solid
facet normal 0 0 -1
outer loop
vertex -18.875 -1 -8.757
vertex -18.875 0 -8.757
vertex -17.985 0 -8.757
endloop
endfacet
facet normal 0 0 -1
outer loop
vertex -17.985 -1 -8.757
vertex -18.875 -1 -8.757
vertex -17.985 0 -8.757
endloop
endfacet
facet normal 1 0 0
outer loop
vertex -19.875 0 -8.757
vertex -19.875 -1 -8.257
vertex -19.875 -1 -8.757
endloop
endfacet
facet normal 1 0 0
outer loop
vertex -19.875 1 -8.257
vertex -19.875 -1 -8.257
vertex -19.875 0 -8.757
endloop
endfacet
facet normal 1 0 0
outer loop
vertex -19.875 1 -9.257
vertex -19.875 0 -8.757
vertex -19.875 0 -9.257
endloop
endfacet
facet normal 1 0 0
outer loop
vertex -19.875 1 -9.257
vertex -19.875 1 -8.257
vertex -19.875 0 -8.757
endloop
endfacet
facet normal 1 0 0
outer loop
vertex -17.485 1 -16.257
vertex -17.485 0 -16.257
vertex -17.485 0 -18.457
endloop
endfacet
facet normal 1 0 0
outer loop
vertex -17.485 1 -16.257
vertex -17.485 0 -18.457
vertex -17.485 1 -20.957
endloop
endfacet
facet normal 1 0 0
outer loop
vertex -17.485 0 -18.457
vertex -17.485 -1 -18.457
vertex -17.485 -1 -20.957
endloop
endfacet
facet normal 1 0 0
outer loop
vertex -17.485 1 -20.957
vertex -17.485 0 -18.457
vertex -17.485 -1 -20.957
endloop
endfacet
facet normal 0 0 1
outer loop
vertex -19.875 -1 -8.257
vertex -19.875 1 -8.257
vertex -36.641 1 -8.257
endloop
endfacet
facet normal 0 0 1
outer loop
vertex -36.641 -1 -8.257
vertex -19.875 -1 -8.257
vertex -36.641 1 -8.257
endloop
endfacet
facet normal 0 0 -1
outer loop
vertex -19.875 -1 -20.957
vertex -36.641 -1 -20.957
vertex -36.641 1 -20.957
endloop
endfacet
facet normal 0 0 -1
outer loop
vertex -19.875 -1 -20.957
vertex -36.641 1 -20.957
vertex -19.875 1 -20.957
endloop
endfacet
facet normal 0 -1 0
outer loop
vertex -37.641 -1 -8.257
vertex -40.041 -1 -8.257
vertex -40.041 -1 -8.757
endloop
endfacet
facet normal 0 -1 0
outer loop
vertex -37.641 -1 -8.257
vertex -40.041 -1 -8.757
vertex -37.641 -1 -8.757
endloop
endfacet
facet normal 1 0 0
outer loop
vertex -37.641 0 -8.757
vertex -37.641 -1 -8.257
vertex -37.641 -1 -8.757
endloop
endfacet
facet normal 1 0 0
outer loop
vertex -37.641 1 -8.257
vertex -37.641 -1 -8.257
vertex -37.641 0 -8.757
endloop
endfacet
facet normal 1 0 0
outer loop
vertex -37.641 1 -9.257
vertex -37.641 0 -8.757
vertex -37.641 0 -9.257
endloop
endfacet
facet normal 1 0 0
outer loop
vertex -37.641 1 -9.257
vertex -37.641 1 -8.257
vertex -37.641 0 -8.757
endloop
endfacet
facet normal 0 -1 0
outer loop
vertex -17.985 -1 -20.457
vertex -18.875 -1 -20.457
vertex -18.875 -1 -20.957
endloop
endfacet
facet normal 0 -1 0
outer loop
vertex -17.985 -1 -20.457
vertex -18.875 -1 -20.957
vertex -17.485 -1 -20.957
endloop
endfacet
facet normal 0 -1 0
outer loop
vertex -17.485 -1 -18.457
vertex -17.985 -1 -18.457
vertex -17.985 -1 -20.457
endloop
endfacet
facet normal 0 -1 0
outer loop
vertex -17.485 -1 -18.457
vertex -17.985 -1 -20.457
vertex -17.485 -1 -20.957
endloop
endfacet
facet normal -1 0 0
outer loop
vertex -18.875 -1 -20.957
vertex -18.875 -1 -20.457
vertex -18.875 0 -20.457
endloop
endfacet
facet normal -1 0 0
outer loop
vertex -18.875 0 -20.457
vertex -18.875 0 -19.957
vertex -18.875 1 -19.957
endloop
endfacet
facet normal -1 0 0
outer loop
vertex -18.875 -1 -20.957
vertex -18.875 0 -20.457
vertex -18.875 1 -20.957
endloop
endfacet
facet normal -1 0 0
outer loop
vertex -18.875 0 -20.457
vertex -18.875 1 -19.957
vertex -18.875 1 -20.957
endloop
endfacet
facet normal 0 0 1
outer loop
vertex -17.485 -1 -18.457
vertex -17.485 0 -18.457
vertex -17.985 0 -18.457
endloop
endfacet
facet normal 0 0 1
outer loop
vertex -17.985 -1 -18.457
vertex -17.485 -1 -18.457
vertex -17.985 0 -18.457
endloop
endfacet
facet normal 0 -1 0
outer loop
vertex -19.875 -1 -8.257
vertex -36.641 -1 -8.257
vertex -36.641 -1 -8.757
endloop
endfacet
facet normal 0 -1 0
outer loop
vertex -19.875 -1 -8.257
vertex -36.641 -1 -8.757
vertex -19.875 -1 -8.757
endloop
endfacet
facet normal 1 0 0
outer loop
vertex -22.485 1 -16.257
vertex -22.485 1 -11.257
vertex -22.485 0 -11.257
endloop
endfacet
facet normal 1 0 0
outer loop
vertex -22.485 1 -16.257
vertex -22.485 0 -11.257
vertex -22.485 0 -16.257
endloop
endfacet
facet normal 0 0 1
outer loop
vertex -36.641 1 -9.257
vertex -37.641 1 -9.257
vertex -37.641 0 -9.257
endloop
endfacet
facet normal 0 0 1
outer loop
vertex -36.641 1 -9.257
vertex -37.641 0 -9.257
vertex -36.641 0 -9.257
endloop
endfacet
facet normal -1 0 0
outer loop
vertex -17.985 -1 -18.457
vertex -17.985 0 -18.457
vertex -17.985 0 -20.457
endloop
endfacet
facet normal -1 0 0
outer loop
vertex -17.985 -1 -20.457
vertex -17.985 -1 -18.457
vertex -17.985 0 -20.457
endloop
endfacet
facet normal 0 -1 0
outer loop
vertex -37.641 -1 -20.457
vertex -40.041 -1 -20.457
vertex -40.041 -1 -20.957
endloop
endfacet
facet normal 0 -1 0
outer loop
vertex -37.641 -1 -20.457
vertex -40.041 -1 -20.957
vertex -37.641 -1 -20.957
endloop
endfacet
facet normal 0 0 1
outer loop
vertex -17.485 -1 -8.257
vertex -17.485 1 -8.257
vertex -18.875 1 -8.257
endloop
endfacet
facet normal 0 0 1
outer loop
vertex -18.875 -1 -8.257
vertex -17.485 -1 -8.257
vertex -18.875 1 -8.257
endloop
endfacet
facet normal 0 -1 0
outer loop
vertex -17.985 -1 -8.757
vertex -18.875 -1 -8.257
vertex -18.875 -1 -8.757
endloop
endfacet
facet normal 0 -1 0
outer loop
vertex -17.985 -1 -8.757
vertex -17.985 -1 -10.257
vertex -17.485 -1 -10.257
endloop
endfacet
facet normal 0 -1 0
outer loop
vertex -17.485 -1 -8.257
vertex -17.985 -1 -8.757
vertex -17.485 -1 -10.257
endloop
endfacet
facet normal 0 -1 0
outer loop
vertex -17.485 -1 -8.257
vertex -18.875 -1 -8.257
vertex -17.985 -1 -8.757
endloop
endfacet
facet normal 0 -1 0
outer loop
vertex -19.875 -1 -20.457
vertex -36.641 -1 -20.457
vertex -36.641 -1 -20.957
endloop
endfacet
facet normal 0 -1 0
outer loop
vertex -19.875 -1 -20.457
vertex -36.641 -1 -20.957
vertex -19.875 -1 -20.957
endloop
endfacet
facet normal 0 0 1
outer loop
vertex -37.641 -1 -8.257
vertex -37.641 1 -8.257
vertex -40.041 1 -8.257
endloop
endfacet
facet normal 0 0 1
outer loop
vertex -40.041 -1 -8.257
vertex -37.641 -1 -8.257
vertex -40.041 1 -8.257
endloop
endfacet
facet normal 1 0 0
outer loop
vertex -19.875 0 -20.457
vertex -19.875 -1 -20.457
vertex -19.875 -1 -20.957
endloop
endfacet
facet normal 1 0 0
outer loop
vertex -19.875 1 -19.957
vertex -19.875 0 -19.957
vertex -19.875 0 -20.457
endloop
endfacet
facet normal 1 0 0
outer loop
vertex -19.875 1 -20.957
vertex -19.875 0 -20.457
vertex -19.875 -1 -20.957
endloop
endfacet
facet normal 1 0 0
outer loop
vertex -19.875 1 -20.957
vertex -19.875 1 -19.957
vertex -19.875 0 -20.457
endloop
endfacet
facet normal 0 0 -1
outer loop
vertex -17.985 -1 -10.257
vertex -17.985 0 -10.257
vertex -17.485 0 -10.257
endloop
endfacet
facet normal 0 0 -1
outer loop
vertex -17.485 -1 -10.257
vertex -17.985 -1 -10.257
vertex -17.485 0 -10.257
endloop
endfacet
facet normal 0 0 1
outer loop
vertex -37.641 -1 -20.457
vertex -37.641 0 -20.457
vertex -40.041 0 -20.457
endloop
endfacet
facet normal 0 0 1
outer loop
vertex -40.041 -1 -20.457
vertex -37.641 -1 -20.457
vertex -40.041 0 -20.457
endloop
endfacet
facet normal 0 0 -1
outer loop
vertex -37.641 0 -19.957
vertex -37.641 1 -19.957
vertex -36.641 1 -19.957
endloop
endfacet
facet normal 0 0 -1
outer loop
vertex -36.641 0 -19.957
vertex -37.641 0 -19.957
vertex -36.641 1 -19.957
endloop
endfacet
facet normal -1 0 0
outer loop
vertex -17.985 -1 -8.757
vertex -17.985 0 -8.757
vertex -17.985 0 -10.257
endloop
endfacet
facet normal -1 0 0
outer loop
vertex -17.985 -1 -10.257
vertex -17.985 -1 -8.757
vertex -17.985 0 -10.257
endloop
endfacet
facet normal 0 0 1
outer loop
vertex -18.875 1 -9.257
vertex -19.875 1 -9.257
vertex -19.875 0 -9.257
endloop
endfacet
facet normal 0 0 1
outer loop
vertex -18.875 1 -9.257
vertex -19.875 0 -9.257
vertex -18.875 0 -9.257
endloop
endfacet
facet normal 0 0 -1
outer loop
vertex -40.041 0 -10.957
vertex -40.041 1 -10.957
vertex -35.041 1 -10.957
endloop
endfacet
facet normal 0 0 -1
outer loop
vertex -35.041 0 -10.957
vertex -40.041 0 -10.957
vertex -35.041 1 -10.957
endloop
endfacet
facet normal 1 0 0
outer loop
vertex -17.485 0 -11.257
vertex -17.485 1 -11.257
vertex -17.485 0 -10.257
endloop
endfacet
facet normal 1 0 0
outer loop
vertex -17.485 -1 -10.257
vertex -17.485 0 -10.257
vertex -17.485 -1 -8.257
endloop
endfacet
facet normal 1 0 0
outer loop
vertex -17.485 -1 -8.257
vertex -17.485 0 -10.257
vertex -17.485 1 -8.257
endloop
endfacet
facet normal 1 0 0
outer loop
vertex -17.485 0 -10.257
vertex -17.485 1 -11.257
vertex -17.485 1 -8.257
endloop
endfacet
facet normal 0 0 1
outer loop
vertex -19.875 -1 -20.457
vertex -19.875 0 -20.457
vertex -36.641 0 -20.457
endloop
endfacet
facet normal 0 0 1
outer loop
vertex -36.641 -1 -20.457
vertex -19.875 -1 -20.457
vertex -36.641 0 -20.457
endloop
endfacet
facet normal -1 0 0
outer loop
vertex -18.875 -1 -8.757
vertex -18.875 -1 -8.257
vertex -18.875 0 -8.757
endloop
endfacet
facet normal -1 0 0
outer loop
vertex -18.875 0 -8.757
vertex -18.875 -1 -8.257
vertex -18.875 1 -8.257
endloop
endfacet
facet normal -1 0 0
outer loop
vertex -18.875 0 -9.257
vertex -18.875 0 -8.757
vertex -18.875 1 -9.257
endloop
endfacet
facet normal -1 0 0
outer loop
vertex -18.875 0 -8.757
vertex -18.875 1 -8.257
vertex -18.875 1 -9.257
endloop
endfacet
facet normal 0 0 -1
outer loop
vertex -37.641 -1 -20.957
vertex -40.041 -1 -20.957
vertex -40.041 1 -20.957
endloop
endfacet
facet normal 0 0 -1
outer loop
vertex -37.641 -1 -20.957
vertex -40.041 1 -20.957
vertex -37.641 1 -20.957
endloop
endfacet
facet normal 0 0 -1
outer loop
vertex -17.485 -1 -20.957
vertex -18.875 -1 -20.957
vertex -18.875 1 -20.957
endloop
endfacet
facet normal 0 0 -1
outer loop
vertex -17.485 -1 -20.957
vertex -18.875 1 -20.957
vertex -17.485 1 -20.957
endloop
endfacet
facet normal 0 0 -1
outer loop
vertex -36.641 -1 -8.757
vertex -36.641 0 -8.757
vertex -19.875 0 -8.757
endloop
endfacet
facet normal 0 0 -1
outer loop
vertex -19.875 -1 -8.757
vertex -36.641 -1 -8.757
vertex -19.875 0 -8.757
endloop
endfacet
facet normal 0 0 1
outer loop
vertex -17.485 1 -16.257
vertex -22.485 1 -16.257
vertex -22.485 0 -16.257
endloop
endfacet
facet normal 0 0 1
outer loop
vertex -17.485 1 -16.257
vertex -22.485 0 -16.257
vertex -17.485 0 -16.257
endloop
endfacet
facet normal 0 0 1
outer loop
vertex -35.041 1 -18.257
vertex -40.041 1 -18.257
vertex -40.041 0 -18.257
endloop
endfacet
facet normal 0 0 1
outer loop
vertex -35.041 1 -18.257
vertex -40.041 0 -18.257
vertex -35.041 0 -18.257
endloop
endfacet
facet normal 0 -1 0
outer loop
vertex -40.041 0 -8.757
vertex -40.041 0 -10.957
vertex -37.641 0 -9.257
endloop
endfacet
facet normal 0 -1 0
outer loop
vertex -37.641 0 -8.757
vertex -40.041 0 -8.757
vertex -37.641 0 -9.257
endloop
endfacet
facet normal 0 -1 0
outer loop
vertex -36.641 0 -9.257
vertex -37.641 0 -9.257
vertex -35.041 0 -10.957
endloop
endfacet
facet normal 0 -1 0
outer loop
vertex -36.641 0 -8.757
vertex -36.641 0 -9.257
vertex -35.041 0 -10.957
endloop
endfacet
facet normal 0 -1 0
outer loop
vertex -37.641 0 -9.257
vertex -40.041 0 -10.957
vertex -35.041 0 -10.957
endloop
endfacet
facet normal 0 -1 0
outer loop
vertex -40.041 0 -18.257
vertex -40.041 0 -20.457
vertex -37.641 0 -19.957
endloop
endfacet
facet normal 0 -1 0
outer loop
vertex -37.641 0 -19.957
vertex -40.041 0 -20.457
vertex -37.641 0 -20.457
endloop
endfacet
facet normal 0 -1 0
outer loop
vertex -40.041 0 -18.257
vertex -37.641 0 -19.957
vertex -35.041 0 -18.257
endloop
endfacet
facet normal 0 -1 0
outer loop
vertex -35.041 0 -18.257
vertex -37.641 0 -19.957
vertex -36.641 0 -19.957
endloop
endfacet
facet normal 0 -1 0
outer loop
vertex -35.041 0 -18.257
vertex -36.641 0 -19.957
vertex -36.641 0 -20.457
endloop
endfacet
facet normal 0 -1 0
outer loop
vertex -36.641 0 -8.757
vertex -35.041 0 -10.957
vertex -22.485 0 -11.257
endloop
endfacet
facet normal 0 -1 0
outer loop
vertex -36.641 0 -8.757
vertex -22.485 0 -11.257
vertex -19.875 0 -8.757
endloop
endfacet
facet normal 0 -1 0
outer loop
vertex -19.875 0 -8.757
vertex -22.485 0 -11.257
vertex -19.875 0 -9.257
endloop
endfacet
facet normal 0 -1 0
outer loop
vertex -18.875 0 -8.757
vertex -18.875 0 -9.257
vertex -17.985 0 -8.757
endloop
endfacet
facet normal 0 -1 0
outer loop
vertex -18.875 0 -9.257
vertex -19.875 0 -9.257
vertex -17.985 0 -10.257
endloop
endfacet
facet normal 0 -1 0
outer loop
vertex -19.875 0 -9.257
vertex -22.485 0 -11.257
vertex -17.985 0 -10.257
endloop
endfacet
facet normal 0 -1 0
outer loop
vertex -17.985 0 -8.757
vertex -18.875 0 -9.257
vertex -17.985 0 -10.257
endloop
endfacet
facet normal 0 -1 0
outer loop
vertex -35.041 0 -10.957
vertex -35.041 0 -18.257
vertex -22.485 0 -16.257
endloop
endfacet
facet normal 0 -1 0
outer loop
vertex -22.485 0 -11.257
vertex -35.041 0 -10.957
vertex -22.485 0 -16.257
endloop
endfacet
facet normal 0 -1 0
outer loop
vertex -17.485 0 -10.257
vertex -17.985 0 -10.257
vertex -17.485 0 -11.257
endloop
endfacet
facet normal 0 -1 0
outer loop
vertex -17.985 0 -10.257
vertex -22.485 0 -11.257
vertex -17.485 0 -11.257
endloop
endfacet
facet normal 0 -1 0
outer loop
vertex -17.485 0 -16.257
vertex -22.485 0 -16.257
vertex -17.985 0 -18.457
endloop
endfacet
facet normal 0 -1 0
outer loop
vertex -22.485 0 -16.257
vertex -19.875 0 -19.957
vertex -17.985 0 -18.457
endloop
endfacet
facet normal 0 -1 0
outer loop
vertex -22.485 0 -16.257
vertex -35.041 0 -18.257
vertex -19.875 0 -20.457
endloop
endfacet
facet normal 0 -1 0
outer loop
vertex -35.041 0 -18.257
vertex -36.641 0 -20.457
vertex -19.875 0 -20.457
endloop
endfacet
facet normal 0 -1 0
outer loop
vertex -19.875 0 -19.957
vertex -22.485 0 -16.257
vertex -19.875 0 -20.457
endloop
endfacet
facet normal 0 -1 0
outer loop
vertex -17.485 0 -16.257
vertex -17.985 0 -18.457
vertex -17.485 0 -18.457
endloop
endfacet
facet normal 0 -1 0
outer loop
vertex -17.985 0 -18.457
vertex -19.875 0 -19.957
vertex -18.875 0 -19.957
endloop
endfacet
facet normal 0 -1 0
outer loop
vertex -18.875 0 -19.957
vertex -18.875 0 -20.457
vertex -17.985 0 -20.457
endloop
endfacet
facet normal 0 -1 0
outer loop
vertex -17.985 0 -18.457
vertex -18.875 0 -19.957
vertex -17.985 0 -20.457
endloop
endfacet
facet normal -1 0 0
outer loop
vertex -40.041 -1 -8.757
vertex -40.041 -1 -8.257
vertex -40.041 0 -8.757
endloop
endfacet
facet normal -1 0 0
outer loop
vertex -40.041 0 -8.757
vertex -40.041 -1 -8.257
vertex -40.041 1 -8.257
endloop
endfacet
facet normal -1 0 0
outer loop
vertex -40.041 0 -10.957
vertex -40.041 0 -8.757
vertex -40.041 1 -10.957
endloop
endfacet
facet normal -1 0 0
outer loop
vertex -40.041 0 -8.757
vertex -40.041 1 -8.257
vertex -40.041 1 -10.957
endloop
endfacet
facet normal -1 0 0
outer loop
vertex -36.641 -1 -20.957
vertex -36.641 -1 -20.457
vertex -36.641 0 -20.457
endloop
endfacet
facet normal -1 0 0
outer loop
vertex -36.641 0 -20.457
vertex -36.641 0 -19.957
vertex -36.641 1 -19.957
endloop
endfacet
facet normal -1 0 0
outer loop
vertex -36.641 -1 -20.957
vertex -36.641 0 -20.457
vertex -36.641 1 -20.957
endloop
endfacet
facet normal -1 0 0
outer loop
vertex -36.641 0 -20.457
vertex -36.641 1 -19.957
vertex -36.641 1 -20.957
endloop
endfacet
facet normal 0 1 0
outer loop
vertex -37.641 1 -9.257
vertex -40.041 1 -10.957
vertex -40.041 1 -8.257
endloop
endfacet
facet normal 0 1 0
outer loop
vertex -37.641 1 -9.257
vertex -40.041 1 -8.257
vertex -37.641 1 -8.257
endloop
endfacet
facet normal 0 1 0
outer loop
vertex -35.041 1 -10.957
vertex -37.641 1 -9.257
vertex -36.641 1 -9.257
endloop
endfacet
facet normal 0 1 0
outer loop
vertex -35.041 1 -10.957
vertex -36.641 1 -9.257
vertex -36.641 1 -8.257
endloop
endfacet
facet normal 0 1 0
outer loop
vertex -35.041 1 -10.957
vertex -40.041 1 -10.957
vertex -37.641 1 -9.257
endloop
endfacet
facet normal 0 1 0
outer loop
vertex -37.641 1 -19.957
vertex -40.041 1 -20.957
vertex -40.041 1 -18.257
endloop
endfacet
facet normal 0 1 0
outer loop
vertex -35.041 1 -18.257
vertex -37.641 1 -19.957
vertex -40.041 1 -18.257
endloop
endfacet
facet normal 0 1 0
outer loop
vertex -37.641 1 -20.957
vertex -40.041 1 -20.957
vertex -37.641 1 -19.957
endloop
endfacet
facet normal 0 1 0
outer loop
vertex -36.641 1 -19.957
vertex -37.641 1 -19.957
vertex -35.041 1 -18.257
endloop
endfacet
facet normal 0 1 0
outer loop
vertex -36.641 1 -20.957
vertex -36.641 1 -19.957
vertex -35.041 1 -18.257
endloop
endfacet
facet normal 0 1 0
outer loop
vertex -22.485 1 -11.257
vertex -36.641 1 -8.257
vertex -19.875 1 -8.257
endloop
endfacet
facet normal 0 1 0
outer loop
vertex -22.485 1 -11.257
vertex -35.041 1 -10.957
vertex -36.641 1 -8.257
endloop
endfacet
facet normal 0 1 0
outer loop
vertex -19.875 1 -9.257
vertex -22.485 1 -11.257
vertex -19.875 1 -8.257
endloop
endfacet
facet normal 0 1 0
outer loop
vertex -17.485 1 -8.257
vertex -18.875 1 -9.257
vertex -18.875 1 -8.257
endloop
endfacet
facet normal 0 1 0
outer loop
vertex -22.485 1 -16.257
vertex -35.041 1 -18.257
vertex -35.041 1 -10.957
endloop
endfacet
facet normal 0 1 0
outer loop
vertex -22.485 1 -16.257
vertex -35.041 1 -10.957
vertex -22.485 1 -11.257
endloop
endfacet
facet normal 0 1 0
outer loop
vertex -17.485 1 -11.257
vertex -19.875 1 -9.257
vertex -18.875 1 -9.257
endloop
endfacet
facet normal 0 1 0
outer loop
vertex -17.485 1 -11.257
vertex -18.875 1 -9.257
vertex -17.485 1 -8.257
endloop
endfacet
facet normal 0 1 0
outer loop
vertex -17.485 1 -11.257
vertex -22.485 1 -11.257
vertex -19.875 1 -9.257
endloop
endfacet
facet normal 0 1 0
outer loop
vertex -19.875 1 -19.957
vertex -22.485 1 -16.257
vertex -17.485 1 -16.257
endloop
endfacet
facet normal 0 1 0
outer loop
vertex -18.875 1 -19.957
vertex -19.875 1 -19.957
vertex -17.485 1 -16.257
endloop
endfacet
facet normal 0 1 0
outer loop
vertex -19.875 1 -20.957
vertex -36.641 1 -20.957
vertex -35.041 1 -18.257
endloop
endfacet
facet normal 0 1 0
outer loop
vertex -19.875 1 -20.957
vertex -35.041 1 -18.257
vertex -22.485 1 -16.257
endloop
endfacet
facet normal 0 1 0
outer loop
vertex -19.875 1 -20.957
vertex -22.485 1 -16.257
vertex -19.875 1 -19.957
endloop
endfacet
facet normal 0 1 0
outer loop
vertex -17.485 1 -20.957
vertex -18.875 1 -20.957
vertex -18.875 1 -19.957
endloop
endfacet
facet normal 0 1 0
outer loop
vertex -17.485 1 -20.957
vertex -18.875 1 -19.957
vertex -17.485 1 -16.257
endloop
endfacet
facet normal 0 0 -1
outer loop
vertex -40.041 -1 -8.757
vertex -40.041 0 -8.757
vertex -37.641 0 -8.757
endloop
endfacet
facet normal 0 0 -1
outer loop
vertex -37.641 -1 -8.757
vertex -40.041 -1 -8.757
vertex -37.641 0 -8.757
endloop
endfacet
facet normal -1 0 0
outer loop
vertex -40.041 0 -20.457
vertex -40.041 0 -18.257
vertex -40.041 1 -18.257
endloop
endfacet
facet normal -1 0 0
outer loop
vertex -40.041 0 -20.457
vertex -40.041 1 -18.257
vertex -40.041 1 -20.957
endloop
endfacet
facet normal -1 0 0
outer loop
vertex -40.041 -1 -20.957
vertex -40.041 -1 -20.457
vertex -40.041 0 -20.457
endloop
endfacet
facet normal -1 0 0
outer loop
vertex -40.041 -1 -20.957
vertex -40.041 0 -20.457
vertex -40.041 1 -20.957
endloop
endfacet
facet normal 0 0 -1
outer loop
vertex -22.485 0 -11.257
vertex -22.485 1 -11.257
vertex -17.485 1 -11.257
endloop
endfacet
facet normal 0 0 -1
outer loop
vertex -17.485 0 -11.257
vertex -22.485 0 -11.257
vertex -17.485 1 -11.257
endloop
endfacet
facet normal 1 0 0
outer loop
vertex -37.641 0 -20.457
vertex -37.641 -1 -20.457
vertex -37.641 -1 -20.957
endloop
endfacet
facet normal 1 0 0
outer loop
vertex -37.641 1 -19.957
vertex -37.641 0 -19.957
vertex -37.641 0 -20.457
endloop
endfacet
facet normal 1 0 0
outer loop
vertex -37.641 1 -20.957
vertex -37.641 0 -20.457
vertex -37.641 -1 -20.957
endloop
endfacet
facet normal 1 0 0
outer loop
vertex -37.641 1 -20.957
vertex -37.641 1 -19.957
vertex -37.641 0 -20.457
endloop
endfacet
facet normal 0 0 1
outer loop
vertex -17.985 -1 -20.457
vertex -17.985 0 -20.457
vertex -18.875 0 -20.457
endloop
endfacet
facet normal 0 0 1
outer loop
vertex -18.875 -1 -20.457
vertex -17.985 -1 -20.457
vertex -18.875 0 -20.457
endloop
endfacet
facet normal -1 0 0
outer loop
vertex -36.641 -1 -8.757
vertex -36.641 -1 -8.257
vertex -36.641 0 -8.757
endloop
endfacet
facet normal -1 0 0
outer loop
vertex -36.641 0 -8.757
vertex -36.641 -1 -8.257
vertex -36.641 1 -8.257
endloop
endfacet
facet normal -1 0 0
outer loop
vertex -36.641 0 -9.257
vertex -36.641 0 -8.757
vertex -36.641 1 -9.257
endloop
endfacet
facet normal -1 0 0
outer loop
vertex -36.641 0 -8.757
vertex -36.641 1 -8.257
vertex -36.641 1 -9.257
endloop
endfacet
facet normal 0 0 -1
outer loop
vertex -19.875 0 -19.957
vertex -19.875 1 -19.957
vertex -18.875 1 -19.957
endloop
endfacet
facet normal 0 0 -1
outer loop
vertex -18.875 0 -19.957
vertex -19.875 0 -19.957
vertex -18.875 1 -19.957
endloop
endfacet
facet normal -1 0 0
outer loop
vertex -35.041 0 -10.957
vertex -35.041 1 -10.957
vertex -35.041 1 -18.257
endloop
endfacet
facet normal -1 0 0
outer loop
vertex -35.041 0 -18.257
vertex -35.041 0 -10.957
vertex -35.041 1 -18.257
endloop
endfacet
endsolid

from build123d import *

# Parameters (mm, degrees)
SKETCH1_W           = 22.5552
SKETCH1_H           = 12.7
BOSS_EXTRUDE1_DEPTH = 1
SKETCH2_W           = 5
SKETCH2_H           = 7.3
CUT_EXTRUDE1_DEPTH  = 1
SKETCH3_W           = 5
SKETCH3_H           = 5
CUT_EXTRUDE2_DEPTH  = 1
BOSS_EXTRUDE2_DEPTH = 1
SKETCH7_W           = 1
SKETCH7_H           = 1
CUT_EXTRUDE3_DEPTH  = 3


with BuildPart() as part:
    # Sketch1 → Boss-Extrude1 (new body)
    with BuildSketch(Plane(origin=(0, 0, 0), x_dir=(1, 0, 0), z_dir=(0, 1, 0))):
        with Locations((-28.763088774, 14.606547542)):
            Rectangle(SKETCH1_W, SKETCH1_H)
    extrude(amount=BOSS_EXTRUDE1_DEPTH)

    # Sketch2 → Cut-Extrude1 (cut)
    with BuildSketch(Plane(origin=(0, 1, 0), x_dir=(1, 0, 0), z_dir=(0, 1, 0))):
        with Locations((-37.540688774, 14.606547542)):
            Rectangle(SKETCH2_W, SKETCH2_H)
    extrude(amount=-CUT_EXTRUDE1_DEPTH, mode=Mode.SUBTRACT)

    # Sketch3 → Cut-Extrude2 (cut)
    with BuildSketch(Plane(origin=(0, 1, 0), x_dir=(1, 0, 0), z_dir=(0, 1, 0))):
        with Locations((-19.985488774, 13.756547542)):
            Rectangle(SKETCH3_W, SKETCH3_H)
    extrude(amount=-CUT_EXTRUDE2_DEPTH, mode=Mode.SUBTRACT)

    # Sketch4 → Boss-Extrude2 (add)
    with BuildSketch(Plane.XZ):
        Polygon((-40.040688774, -8.256547542), (-40.040688774, -8.756547542), (-17.985488774, -8.756547542), (-17.985488774, -10.256547542), (-17.485488774, -10.256547542), (-17.485488774, -8.256547542), align=None)
        Polygon((-17.985488774, -20.456547542), (-40.040688774, -20.456547542), (-40.040688774, -20.956547542), (-17.485488774, -20.956547542), (-17.485488774, -18.456547542), (-17.985488774, -18.456547542), align=None)
    extrude(amount=BOSS_EXTRUDE2_DEPTH)

    # Sketch7 → Cut-Extrude3 (cut)
    with BuildSketch(Plane(origin=(0, 1, 0), x_dir=(1, 0, 0), z_dir=(0, 1, 0))):
        with Locations((-37.140688774, 20.456547542)):
            Rectangle(SKETCH7_W, SKETCH7_H)
        with Locations((-37.140688774, 8.756547542)):
            Rectangle(SKETCH7_W, SKETCH7_H)
        with Locations((-19.375488774, 20.456547542)):
            Rectangle(SKETCH7_W, SKETCH7_H)
        with Locations((-19.375488774, 8.756547542)):
            Rectangle(SKETCH7_W, SKETCH7_H)
    extrude(amount=-CUT_EXTRUDE3_DEPTH, mode=Mode.SUBTRACT)


solid = part.part
